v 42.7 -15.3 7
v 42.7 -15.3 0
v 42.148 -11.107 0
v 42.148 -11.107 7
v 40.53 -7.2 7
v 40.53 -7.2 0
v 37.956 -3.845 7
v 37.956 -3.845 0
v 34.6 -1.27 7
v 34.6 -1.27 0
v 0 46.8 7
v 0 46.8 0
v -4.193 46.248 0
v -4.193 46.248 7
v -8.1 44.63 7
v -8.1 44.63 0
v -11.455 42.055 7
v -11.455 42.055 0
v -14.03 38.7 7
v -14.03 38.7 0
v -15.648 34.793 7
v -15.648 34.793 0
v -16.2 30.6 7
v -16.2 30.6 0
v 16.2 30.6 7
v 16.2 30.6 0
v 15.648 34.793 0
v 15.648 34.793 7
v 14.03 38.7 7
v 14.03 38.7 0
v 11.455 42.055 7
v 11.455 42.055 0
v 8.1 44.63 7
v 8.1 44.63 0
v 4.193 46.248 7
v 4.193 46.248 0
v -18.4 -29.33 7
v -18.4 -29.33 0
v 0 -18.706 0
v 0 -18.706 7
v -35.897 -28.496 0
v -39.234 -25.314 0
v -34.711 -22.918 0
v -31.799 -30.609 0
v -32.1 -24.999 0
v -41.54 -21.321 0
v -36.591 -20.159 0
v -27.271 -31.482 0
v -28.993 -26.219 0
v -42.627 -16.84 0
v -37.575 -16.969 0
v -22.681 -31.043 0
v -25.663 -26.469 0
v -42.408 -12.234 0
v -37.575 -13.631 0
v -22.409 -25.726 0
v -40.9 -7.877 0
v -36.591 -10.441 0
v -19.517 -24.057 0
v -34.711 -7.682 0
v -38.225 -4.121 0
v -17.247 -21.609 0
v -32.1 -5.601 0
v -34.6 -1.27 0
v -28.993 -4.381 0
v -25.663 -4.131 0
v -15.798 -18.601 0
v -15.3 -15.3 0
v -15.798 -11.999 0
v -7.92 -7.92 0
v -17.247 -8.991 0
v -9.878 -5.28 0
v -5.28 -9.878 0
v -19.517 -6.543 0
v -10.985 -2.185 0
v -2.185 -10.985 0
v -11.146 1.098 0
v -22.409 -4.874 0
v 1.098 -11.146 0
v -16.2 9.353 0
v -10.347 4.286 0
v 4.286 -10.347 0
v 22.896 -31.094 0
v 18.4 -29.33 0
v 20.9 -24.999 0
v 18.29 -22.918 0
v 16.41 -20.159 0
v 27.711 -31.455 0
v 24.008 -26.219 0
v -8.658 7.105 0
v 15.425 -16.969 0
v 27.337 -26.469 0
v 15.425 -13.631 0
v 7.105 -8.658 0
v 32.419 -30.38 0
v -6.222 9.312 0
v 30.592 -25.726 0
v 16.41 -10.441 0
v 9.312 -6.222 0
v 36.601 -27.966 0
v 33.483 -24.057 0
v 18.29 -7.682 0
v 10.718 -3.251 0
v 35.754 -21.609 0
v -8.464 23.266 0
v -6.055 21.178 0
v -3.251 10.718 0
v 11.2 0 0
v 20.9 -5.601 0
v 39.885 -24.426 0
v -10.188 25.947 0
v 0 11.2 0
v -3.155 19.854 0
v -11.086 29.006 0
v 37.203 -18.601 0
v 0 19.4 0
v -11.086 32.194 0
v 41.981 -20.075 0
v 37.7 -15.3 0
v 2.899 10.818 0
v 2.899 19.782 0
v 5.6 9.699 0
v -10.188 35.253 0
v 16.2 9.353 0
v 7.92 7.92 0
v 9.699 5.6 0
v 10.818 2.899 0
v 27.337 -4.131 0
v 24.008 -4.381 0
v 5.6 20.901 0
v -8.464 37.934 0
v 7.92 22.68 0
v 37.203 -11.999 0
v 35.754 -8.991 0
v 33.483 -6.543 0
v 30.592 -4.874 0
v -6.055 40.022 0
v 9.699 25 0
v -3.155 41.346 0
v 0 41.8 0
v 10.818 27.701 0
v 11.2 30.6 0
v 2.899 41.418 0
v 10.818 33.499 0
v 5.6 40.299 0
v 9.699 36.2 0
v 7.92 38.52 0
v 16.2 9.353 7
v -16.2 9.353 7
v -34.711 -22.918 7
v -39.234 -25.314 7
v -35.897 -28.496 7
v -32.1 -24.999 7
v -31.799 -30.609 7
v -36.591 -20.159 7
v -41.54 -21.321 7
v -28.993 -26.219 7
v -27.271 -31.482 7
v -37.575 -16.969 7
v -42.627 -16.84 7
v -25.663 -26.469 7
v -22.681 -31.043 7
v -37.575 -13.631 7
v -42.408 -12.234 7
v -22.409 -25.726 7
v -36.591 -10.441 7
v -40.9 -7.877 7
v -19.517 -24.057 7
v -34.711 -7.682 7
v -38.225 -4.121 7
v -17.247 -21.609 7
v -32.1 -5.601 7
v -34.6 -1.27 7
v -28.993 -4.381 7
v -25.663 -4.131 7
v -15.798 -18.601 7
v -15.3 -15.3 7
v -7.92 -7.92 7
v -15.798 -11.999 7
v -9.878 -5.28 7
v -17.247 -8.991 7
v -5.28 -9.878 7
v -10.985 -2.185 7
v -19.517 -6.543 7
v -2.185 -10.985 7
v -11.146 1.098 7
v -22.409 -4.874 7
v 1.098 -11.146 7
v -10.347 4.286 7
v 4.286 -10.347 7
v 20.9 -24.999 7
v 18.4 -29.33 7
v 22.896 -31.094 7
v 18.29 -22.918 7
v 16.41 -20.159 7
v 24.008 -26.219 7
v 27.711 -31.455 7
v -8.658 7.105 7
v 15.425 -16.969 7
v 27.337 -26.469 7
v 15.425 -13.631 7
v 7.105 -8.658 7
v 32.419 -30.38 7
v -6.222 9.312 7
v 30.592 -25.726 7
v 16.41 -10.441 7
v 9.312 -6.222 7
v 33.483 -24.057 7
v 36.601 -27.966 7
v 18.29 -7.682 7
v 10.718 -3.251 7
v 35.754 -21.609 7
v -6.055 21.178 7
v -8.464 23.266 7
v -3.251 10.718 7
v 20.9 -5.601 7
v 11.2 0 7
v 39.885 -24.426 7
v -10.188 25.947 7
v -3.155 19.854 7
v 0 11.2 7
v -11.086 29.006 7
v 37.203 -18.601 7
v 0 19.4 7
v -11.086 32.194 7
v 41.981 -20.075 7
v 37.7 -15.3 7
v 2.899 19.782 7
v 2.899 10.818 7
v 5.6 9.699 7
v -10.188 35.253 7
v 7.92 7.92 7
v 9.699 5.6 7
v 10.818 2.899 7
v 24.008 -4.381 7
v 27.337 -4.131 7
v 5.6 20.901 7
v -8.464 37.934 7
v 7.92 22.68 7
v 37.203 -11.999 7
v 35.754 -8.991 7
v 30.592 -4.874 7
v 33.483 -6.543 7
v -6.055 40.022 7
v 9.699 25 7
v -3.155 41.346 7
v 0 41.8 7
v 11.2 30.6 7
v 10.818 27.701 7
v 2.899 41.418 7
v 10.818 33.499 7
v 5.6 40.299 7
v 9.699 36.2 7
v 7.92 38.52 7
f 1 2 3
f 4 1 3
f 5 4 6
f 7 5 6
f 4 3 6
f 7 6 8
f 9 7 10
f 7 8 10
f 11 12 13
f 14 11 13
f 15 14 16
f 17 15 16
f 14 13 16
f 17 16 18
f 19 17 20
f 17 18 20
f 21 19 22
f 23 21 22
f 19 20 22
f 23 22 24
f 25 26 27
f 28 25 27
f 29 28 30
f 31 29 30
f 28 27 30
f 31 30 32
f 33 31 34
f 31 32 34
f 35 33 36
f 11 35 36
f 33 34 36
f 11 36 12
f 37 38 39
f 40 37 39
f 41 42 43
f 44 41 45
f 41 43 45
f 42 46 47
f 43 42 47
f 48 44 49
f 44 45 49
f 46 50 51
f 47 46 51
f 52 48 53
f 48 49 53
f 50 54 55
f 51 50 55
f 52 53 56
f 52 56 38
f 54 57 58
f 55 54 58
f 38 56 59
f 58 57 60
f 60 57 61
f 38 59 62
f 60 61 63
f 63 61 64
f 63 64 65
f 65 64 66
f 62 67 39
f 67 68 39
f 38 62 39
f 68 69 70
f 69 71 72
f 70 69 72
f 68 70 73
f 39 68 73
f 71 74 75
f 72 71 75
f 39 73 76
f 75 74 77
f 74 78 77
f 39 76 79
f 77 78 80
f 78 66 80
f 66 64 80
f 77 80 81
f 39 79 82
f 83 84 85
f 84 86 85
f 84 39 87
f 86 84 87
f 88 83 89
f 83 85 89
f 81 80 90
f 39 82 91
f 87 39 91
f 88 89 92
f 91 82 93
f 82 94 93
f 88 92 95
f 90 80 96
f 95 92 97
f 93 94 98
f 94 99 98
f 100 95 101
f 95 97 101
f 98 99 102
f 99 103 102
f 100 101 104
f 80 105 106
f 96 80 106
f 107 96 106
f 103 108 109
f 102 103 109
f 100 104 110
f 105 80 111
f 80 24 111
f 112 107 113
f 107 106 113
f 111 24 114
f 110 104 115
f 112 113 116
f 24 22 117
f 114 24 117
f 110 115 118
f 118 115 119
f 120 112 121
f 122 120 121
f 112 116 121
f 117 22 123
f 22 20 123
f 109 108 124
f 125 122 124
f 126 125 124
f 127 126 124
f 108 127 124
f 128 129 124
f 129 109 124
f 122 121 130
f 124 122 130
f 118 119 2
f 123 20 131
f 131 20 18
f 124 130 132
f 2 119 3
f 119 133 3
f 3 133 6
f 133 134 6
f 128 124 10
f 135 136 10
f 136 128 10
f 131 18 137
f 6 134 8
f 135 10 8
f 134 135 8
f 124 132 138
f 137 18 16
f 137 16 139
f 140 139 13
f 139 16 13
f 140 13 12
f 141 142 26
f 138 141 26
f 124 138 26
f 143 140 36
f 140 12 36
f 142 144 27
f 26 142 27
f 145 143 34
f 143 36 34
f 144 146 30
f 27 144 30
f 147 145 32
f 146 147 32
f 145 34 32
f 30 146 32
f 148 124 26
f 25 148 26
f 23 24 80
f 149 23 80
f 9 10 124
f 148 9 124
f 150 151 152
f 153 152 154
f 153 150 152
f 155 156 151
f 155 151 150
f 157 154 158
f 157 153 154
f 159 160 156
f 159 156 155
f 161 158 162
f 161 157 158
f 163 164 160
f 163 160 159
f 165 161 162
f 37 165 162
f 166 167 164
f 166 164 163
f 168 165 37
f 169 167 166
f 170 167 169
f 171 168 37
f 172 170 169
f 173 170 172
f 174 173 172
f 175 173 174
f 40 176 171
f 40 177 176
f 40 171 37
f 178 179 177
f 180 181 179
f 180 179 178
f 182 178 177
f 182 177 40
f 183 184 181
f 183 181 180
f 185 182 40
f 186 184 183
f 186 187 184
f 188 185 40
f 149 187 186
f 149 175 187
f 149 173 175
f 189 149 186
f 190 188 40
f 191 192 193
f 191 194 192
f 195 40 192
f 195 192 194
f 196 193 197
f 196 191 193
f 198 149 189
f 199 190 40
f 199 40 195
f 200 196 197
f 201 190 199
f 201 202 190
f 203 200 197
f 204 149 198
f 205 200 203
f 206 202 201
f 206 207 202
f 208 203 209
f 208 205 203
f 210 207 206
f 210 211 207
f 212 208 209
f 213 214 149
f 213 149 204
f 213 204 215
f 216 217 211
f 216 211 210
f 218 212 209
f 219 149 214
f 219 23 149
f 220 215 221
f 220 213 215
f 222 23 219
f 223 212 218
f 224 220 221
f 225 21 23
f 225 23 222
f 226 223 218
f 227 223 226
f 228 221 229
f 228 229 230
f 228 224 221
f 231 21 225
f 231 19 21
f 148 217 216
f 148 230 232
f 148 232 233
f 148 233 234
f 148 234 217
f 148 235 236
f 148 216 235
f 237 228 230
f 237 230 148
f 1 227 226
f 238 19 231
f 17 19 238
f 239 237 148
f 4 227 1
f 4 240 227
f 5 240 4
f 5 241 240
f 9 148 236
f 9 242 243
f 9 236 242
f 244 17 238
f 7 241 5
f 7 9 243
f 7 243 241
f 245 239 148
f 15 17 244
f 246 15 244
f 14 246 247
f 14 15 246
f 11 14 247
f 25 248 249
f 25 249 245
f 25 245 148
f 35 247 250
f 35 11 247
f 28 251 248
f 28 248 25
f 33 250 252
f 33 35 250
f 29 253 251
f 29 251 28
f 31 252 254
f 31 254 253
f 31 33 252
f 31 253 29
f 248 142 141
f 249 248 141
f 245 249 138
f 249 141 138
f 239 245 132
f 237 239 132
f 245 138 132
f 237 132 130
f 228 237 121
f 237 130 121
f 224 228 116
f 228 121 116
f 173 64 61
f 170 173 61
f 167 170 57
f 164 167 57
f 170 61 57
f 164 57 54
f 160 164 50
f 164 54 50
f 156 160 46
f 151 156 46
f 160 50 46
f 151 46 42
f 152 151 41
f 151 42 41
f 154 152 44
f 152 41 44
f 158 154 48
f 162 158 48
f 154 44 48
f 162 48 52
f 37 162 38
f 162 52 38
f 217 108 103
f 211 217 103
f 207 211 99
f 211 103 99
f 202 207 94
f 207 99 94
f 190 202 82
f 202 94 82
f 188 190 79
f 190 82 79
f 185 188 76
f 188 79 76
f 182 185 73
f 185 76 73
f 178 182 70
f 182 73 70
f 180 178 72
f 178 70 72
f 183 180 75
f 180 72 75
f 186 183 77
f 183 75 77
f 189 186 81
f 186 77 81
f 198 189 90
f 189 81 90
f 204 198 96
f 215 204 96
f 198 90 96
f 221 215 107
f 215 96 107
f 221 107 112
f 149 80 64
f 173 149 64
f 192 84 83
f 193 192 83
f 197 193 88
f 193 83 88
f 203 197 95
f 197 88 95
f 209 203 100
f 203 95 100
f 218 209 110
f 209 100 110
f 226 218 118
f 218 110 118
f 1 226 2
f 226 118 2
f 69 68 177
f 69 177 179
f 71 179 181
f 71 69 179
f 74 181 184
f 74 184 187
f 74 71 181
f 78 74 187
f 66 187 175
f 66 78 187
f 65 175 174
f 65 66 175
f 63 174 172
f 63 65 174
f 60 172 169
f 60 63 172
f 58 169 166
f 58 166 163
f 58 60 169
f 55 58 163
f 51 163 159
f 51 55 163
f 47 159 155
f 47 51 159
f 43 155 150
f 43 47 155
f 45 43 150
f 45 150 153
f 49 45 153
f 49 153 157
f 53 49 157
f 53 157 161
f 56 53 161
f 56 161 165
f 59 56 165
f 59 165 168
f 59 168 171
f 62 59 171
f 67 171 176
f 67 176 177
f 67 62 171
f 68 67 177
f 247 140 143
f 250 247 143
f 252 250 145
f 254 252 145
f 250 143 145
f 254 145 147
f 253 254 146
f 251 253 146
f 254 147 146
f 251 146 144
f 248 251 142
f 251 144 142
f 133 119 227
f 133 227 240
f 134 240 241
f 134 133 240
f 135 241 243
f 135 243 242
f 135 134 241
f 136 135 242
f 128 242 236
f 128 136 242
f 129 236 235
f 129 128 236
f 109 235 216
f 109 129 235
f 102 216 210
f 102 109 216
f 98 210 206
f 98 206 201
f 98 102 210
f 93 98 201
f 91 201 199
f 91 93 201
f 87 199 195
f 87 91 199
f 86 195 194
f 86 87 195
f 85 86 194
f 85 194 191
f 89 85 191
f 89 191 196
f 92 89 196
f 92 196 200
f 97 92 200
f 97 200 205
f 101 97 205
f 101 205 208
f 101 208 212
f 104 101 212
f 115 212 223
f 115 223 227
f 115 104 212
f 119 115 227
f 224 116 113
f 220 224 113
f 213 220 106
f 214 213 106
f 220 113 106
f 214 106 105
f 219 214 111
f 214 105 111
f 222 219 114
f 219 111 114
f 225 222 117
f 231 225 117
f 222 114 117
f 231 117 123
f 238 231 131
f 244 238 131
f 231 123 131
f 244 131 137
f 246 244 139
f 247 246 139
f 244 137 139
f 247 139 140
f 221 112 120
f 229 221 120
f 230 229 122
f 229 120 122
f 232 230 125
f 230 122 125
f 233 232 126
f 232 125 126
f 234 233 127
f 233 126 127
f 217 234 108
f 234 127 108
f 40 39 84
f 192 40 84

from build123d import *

# Parameters (mm, degrees)
F0_R     = 11.2
F1_DEPTH = 7


with BuildPart() as f1:
    # F0 (on Top) → F1 (new body)
    with BuildSketch(Plane.XY):
        with BuildLine():
            ThreePointArc((-10.5879527755, -12.2611278447), (-14.0296115413, -8.1), (-15.9124245803, -3.0388721553))
            ThreePointArc((-15.9124245803, -3.0388721553), (-24.9741529622, 0.8279459046), (-34.6003773558, -1.2703884587))
            ThreePointArc((-34.6003773558, -1.2703884587), (-40.5299888971, -23.4), (-18.4003773558, -29.3296115413))
            ThreePointArc((-18.4003773558, -29.3296115413), (-12.4707658145, -23.4), (-10.3003773558, -15.3))
            ThreePointArc((-10.3003773558, -15.3), (-10.3724314512, -13.7737756064), (-10.5879527755, -12.2611278447))
        make_face()
        with Locations((-26.5003773558, -15.3)):
            Circle(F0_R, mode=Mode.SUBTRACT)
        with BuildLine():
            ThreePointArc((-15.9124245803, -3.0388721553), (-16.1279459046, -1.5262243936), (-16.2, 0))
            Line((-16.2, 0), (-16.2, 9.3530743609))
            Line((-16.2, 9.3530743609), (-34.6003773558, -1.2703884587))
            ThreePointArc((-34.6003773558, -1.2703884587), (-24.9741529622, 0.8279459046), (-15.9124245803, -3.0388721553))
        make_face()
        with BuildLine():
            ThreePointArc((-10.5879527755, -12.2611278447), (-12.4707658145, -7.2), (-15.9124245803, -3.0388721553))
            ThreePointArc((-15.9124245803, -3.0388721553), (-14.0296115413, -8.1), (-10.5879527755, -12.2611278447))
        make_face()
        with BuildLine():
            ThreePointArc((5.3244718048, 15.3), (2.7, 14.6265845856), (0, 14.4))
            ThreePointArc((0, 14.4), (-2.7, 14.6265845856), (-5.3244718048, 15.3))
            ThreePointArc((-5.3244718048, 15.3), (-6.7422238556, 14.730323061), (-8.1, 14.0296115413))
            ThreePointArc((-8.1, 14.0296115413), (-14.0296115413, 8.1), (-16.2, 0))
            ThreePointArc((-16.2, 0), (-16.1279459046, -1.5262243936), (-15.9124245803, -3.0388721553))
            ThreePointArc((-15.9124245803, -3.0388721553), (-12.4707658145, -7.2), (-10.5879527755, -12.2611278447))
            ThreePointArc((-10.5879527755, -12.2611278447), (-9.385722049, -13.2040986674), (-8.1, -14.0296115413))
            ThreePointArc((-8.1, -14.0296115413), (0, -16.2), (8.1, -14.0296115413))
            ThreePointArc((8.1, -14.0296115413), (9.385722049, -13.2040986674), (10.5879527755, -12.2611278447))
            ThreePointArc((10.5879527755, -12.2611278447), (12.4707658145, -7.2), (15.9124245803, -3.0388721553))
            ThreePointArc((15.9124245803, -3.0388721553), (16.1279459046, -1.5262243936), (16.2, 0))
            ThreePointArc((16.2, 0), (14.0296115413, 8.1), (8.1, 14.0296115413))
            ThreePointArc((8.1, 14.0296115413), (6.7422238556, 14.730323061), (5.3244718048, 15.3))
        make_face()
        with BuildLine():
            ThreePointArc((0, 11.2), (7.9195959493, 7.9195959493), (11.2, 0))
            ThreePointArc((11.2, 0), (-7.9195959493, -7.9195959493), (0, 11.2))
        make_face(mode=Mode.SUBTRACT)
        with BuildLine():
            ThreePointArc((-16.2, 0), (-14.0296115413, 8.1), (-8.1, 14.0296115413))
            Line((-8.1, 14.0296115413), (-16.2, 9.3530743609))
            Line((-16.2, 9.3530743609), (-16.2, 0))
        make_face()
        with BuildLine():
            ThreePointArc((-8.1, 14.0296115413), (-6.7422238556, 14.730323061), (-5.3244718048, 15.3))
            ThreePointArc((-5.3244718048, 15.3), (-13.2040986674, 21.214277951), (-16.2, 30.6))
            Line((-16.2, 30.6), (-16.2, 9.3530743609))
            Line((-16.2, 9.3530743609), (-8.1, 14.0296115413))
        make_face()
        with BuildLine():
            Line((0, 16.2), (0, 14.4))
            ThreePointArc((0, 14.4), (2.7, 14.6265845856), (5.3244718048, 15.3))
            ThreePointArc((5.3244718048, 15.3), (2.7, 15.9734154144), (0, 16.2))
        make_face()
        with BuildLine():
            ThreePointArc((-5.3244718048, 15.3), (-2.7, 14.6265845856), (0, 14.4))
            Line((0, 14.4), (0, 16.2))
            ThreePointArc((0, 16.2), (-2.7, 15.9734154144), (-5.3244718048, 15.3))
        make_face()
        with BuildLine():
            ThreePointArc((-5.3244718048, 15.3), (-2.7, 15.9734154144), (0, 16.2))
            Line((0, 16.2), (0, 19.4))
            ThreePointArc((0, 19.4), (-11.2, 30.6), (0, 41.8))
            Line((0, 41.8), (0, 46.8))
            ThreePointArc((0, 46.8), (-11.4551298552, 42.0551298552), (-16.2, 30.6))
            ThreePointArc((-16.2, 30.6), (-13.2040986674, 21.214277951), (-5.3244718048, 15.3))
        make_face()
        with BuildLine():
            Line((0, 19.4), (0, 16.2))
            ThreePointArc((0, 16.2), (2.7, 15.9734154144), (5.3244718048, 15.3))
            ThreePointArc((5.3244718048, 15.3), (13.2040986674, 21.214277951), (16.2, 30.6))
            ThreePointArc((16.2, 30.6), (11.4551298552, 42.0551298552), (0, 46.8))
            Line((0, 46.8), (0, 41.8))
            ThreePointArc((0, 41.8), (7.9195959493, 38.5195959493), (11.2, 30.6))
            ThreePointArc((11.2, 30.6), (7.9195959493, 22.6804040507), (0, 19.4))
        make_face()
        with BuildLine():
            Line((16.2, 9.3530743609), (8.1, 14.0296115413))
            ThreePointArc((8.1, 14.0296115413), (14.0296115413, 8.1), (16.2, 0))
            Line((16.2, 0), (16.2, 9.3530743609))
        make_face()
        with BuildLine():
            ThreePointArc((16.2, 30.6), (13.2040986674, 21.214277951), (5.3244718048, 15.3))
            ThreePointArc((5.3244718048, 15.3), (6.7422238556, 14.730323061), (8.1, 14.0296115413))
            Line((8.1, 14.0296115413), (16.2, 9.3530743609))
            Line((16.2, 9.3530743609), (16.2, 30.6))
        make_face()
        with BuildLine():
            Line((16.2, 9.3530743609), (16.2, 0))
            ThreePointArc((16.2, 0), (16.1279459046, -1.5262243936), (15.9124245803, -3.0388721553))
            ThreePointArc((15.9124245803, -3.0388721553), (24.9741529622, 0.8279459046), (34.6003773558, -1.2703884587))
            Line((34.6003773558, -1.2703884587), (16.2, 9.3530743609))
        make_face()
        with BuildLine():
            ThreePointArc((18.4003773558, -29.3296115413), (11.7700542948, -22.0422238556), (10.5879527755, -12.2611278447))
            ThreePointArc((10.5879527755, -12.2611278447), (9.385722049, -13.2040986674), (8.1, -14.0296115413))
            Line((8.1, -14.0296115413), (0, -18.7061487217))
            Line((0, -18.7061487217), (18.4003773558, -29.3296115413))
        make_face()
        with BuildLine():
            ThreePointArc((-8.1, -14.0296115413), (-9.385722049, -13.2040986674), (-10.5879527755, -12.2611278447))
            ThreePointArc((-10.5879527755, -12.2611278447), (-10.3724314512, -13.7737756064), (-10.3003773558, -15.3))
            ThreePointArc((-10.3003773558, -15.3), (-12.4707658145, -23.4), (-18.4003773558, -29.3296115413))
            Line((-18.4003773558, -29.3296115413), (0, -18.7061487217))
            Line((0, -18.7061487217), (-8.1, -14.0296115413))
        make_face()
        with BuildLine():
            ThreePointArc((34.6003773558, -1.2703884587), (24.9741529622, 0.8279459046), (15.9124245803, -3.0388721553))
            ThreePointArc((15.9124245803, -3.0388721553), (14.0296115413, -8.1), (10.5879527755, -12.2611278447))
            ThreePointArc((10.5879527755, -12.2611278447), (11.7700542948, -22.0422238556), (18.4003773558, -29.3296115413))
            ThreePointArc((18.4003773558, -29.3296115413), (34.6003773558, -29.3296115413), (42.7003773558, -15.3))
            ThreePointArc((42.7003773558, -15.3), (40.5299888971, -7.2), (34.6003773558, -1.2703884587))
        make_face()
        with Locations((26.5003773558, -15.3)):
            Circle(F0_R, mode=Mode.SUBTRACT)
        with BuildLine():
            ThreePointArc((8.1, -14.0296115413), (0, -16.2), (-8.1, -14.0296115413))
            Line((-8.1, -14.0296115413), (0, -18.7061487217))
            Line((0, -18.7061487217), (8.1, -14.0296115413))
        make_face()
        with BuildLine():
            ThreePointArc((10.5879527755, -12.2611278447), (14.0296115413, -8.1), (15.9124245803, -3.0388721553))
            ThreePointArc((15.9124245803, -3.0388721553), (12.4707658145, -7.2), (10.5879527755, -12.2611278447))
        make_face()
    extrude(amount=F1_DEPTH)


solid = f1.part
